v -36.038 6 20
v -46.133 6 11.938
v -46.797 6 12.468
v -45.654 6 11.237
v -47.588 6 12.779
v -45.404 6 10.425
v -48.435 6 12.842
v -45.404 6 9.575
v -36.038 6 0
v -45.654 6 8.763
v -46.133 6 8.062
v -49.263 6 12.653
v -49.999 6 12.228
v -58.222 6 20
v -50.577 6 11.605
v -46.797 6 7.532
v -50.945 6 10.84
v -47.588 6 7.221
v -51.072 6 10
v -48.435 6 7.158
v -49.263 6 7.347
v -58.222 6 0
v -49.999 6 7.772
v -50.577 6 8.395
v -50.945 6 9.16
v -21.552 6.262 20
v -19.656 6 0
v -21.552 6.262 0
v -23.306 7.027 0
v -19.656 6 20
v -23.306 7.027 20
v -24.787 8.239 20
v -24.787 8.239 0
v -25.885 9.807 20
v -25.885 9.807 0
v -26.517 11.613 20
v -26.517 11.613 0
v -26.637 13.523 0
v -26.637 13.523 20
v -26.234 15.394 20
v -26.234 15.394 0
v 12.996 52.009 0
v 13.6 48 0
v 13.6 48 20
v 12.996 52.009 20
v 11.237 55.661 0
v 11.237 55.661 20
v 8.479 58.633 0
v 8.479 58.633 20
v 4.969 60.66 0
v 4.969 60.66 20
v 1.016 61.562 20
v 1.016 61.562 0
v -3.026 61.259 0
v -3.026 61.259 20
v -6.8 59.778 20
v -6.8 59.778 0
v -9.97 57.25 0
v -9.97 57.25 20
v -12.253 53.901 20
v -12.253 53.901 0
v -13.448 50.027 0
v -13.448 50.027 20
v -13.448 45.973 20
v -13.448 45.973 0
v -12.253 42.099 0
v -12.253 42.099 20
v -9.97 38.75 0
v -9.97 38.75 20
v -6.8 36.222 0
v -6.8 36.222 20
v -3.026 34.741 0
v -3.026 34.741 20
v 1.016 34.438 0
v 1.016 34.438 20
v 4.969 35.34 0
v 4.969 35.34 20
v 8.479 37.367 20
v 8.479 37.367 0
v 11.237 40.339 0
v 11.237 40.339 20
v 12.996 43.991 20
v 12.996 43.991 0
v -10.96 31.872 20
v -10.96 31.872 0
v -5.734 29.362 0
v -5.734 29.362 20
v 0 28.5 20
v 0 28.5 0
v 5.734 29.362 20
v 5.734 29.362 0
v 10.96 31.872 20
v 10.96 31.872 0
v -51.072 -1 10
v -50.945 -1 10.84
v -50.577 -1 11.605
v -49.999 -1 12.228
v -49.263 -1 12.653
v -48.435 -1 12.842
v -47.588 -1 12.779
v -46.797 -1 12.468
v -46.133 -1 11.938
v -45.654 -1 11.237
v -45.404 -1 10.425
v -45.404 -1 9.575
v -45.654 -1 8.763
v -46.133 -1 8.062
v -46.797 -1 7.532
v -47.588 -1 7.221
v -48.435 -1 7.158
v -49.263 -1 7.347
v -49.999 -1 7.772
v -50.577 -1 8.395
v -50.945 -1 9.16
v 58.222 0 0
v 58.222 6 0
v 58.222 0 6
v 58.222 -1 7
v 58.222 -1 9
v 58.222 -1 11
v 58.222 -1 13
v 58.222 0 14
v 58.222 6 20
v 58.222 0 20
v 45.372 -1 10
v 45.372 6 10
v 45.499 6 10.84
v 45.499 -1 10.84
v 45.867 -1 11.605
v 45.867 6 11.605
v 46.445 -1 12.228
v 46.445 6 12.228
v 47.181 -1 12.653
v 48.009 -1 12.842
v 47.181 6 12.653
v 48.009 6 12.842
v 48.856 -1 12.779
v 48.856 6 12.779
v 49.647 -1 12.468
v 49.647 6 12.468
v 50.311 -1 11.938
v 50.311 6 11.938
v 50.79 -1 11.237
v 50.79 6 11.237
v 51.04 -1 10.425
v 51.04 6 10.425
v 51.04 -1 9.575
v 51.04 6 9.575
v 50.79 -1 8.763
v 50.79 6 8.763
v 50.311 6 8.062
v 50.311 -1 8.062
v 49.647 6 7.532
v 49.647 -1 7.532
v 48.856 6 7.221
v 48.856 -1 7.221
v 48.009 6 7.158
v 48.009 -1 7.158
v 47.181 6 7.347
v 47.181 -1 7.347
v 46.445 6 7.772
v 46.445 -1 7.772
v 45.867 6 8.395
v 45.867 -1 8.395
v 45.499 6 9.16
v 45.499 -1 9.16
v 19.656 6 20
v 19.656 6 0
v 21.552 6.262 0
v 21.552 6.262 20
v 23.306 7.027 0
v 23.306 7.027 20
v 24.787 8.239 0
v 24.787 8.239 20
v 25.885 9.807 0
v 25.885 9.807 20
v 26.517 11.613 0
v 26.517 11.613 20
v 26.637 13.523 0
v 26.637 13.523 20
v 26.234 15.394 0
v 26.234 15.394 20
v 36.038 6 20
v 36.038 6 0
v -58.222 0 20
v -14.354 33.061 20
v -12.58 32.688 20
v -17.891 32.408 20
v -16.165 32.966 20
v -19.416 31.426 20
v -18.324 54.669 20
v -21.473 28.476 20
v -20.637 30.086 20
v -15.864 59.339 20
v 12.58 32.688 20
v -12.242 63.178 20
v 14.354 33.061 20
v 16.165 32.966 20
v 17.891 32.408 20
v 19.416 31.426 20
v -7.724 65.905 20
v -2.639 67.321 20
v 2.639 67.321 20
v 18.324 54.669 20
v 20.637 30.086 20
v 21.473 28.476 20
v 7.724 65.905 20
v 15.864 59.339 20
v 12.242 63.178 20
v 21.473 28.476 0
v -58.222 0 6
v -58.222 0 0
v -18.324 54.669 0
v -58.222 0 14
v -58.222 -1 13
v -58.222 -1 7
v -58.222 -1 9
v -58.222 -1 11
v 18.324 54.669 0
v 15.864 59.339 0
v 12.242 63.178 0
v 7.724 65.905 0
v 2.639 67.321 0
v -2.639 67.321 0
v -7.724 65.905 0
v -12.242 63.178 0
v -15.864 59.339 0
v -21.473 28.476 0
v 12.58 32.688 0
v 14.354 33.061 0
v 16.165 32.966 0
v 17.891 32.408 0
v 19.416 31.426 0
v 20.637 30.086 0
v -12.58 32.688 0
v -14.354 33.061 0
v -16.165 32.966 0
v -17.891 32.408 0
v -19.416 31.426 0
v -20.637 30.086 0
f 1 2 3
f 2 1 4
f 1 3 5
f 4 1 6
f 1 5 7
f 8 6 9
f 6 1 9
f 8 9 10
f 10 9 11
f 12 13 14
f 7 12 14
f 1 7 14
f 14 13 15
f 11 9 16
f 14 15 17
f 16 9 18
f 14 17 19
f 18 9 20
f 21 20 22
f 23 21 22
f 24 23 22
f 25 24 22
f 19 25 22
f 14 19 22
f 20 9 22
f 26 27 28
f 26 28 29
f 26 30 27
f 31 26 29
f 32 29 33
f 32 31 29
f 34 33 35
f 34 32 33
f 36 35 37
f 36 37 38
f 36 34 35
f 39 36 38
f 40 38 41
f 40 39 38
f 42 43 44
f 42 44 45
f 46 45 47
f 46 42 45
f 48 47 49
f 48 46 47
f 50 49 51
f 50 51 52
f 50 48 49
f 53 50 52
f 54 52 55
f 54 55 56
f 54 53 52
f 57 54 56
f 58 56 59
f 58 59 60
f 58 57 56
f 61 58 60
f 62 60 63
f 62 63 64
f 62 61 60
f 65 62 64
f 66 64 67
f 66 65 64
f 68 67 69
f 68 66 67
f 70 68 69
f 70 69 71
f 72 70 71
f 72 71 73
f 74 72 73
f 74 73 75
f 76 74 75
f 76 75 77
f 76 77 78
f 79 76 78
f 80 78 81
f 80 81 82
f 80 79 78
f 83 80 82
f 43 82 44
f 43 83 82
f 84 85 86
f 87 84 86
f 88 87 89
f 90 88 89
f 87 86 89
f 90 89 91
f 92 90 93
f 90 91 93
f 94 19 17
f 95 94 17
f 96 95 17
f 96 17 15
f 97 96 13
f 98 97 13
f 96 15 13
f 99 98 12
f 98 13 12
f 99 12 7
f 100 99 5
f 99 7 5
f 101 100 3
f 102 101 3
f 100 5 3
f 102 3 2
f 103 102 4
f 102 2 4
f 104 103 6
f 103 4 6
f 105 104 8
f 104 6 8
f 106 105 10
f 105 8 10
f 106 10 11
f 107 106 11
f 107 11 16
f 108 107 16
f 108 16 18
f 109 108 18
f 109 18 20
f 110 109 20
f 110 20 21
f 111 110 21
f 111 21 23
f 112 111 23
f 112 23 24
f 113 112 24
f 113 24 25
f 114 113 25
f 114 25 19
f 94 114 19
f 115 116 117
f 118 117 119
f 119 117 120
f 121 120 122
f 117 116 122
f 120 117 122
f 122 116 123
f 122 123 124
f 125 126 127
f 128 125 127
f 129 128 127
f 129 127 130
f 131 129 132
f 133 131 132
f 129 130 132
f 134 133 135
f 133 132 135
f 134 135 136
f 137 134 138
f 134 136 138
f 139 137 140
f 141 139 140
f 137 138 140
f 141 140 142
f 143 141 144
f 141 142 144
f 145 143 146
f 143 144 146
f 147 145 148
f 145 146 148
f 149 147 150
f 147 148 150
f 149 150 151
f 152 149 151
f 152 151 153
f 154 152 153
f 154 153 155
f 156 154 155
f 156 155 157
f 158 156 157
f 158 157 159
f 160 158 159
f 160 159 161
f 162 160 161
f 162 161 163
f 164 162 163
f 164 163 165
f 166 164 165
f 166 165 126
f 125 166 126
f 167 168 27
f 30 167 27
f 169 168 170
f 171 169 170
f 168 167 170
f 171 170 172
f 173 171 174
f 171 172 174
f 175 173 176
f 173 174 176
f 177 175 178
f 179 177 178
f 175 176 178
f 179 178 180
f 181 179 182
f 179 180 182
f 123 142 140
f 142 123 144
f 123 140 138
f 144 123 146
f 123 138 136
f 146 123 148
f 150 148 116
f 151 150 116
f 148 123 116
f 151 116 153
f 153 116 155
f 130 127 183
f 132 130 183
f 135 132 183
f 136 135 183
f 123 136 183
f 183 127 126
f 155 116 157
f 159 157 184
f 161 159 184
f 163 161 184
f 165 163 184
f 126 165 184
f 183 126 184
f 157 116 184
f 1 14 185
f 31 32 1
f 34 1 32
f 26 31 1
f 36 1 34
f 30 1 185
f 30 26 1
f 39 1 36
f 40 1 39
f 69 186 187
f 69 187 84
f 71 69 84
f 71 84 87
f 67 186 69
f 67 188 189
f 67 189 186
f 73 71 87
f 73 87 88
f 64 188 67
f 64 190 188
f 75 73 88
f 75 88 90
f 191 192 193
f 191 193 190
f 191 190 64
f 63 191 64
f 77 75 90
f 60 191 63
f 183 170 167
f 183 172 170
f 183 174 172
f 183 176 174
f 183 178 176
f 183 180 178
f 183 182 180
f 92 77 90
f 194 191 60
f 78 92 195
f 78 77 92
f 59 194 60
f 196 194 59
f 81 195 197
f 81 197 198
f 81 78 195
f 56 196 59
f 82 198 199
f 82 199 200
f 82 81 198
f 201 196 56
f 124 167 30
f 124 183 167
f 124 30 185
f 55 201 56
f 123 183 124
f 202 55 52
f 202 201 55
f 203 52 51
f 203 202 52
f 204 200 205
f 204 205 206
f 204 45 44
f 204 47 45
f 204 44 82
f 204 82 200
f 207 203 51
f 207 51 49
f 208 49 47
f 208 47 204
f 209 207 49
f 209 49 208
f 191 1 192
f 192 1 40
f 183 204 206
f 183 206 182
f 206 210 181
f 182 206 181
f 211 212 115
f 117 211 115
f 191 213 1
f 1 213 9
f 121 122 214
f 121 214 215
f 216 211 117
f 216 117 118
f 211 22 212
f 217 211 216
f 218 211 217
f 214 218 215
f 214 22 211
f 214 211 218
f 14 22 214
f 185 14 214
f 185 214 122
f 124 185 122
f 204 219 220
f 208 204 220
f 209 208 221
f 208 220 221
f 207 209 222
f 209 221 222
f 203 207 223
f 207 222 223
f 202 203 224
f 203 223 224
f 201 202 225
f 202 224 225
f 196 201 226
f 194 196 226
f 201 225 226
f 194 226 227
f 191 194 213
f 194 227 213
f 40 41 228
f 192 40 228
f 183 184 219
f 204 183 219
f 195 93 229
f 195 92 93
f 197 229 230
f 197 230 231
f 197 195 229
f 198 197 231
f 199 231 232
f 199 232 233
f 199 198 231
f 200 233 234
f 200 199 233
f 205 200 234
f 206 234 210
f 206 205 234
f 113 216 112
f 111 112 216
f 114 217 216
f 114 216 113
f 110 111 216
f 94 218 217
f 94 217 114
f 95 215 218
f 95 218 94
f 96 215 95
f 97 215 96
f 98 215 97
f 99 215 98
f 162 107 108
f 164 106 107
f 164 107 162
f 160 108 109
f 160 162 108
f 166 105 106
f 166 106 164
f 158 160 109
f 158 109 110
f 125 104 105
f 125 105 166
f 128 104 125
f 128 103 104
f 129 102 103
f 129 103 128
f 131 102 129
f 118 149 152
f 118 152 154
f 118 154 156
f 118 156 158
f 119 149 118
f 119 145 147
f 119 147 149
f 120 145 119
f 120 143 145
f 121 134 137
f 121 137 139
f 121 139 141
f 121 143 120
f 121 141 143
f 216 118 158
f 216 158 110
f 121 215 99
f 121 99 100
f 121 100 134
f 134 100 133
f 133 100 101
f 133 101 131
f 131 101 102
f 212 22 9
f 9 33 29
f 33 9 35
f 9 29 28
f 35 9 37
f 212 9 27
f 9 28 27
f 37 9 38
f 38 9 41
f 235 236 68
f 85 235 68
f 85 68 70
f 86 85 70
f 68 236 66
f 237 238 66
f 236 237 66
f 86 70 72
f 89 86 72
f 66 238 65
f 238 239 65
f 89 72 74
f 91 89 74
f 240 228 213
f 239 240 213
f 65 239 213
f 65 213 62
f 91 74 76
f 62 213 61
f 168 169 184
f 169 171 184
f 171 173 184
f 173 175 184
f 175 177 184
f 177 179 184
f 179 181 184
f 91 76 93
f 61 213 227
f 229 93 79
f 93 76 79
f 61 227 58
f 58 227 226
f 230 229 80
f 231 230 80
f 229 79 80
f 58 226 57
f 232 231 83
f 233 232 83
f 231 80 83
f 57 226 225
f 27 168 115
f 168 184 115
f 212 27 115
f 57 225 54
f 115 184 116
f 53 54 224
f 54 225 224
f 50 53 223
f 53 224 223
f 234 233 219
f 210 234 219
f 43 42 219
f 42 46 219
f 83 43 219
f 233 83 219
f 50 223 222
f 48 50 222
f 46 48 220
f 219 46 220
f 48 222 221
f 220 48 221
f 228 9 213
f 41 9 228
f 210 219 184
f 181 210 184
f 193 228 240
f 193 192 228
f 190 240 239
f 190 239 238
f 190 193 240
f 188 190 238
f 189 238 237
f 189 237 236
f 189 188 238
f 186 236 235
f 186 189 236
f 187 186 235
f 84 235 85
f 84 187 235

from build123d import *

# Parameters (mm, degrees)
F0_R        = 13.6
F0_W        = 59.3062995352
F0_H        = 6
F1_DEPTH    = 20
F2_R        = 7
F3_W        = 116.4440756161
F3_H        = 2
F4_DEPTH    = 1
F5_T4_DEPTH = 116.4440756161
F5_T9_DEPTH = 116.4440756161
F6_R        = 2.85
F7_DEPTH    = 25


# Not quite as in the source:
# - a fillet or chamfer that OpenCascade refuses, or shapes differently, is made with other operations: its cross-section is extruded or revolved along the edge and cut away or added


with BuildPart() as f1:
    # F0 (on Top) → F1 (new body)
    with BuildSketch(Plane.XY):
        with BuildLine():
            ThreePointArc((17.4985003919, 39.3946247011), (18.9930350082, 43.5824643545), (19.5, 48))
            ThreePointArc((19.5, 48), (19.2037511837, 51.3861394645), (18.3240061053, 54.6693927949))
            ThreePointArc((18.3240061053, 54.6693927949), (0, 67.5), (-18.3240061053, 54.6693927949))
            ThreePointArc((-18.3240061053, 54.6693927949), (-19.4715851439, 46.9476825647), (-17.4985003919, 39.3946247011))
            ThreePointArc((-17.4985003919, 39.3946247011), (0, 28.5), (17.4985003919, 39.3946247011))
        make_face()
        with Locations((0, 48)):
            Circle(F0_R, mode=Mode.SUBTRACT)
        with BuildLine():
            ThreePointArc((-17.4985003919, 39.3946247011), (-19.4715851439, 46.9476825647), (-18.3240061053, 54.6693927949))
            Line((-18.3240061053, 54.6693927949), (-36.0382164025, 6))
            Line((-36.0382164025, 6), (-29.6531497676, 6))
            Line((-29.6531497676, 6), (-17.4985003919, 39.3946247011))
        make_face()
        Polygon((-29.6531497676, 6), (-36.0382164025, 6), (-38.2220378081, 0), (-29.6531497676, 0), align=None)
        Polygon((-38.2220378081, 0), (-36.0382164025, 6), (-58.2220378081, 6), (-58.2220378081, 0), align=None)
        with Locations((0, 3)):
            Rectangle(F0_W, F0_H)
        Polygon((38.2220378081, 0), (36.0382164025, 6), (29.6531497676, 6), (29.6531497676, 0), align=None)
        Polygon((58.2220378081, 6), (36.0382164025, 6), (38.2220378081, 0), (58.2220378081, 0), align=None)
        with BuildLine():
            ThreePointArc((18.3240061053, 54.6693927949), (19.2037511837, 51.3861394645), (19.5, 48))
            ThreePointArc((19.5, 48), (18.9930350082, 43.5824643545), (17.4985003919, 39.3946247011))
            Line((17.4985003919, 39.3946247011), (29.6531497676, 6))
            Line((29.6531497676, 6), (36.0382164025, 6))
            Line((36.0382164025, 6), (18.3240061053, 54.6693927949))
        make_face()
    extrude(amount=F1_DEPTH)

    # F2
    f2_edges = [f1.edges().sort_by_distance(p)[0] for p in [
        (-17.4985, 39.394625, 10),
        (17.4985, 39.394625, 10),
        (-29.65315, 6, 10),
        (29.65315, 6, 10),
    ]]
    fillet(f2_edges, radius=F2_R)

    # F3 (on face) → F4 (join)
    with BuildSketch(Plane.XZ):
        with Locations((0, 10)):
            Rectangle(F3_W, F3_H)
    extrude(amount=F4_DEPTH)

    # F5: chamfer of 3 on 2 edges, made by hand


with BuildPart() as f5_tool2:
    # F5_s3 → F5_t4 (new body)
    with BuildSketch(Plane.YZ.offset(58.2220378081)):
        Polygon((0, 14), (-3, 11), (0, 11), align=None)
    extrude(amount=-F5_T4_DEPTH)

    split(bisect_by=Plane.XZ.offset(1), keep=Keep.BOTTOM)


with BuildPart() as f1_1:
    add(f1.part)

    # F5_t1: union F5_tool2
    add(f5_tool2.part)


with BuildPart() as f5_tool7:
    # F5_s8 → F5_t9 (new body)
    with BuildSketch(Plane.YZ.offset(-58.2220378081)):
        Polygon((0, 6), (-3, 9), (0, 9), align=None)
    extrude(amount=F5_T9_DEPTH)

    split(bisect_by=Plane.XZ.offset(1), keep=Keep.BOTTOM)


with BuildPart() as f1_2:
    add(f1_1.part)

    # F5_t6: union F5_tool7
    add(f5_tool7.part)

    # F6 (on face) → F7 (cut)
    with BuildSketch(Plane(origin=(0, 6, 0), x_dir=(-1, 0, 0), z_dir=(0, 1, 0))):
        with Locations((48.2220378081, 10)):
            Circle(F6_R)
        with Locations((-48.2220378081, 10)):
            Circle(F6_R)
    extrude(amount=-F7_DEPTH, mode=Mode.SUBTRACT)


solid = f1_2.part
